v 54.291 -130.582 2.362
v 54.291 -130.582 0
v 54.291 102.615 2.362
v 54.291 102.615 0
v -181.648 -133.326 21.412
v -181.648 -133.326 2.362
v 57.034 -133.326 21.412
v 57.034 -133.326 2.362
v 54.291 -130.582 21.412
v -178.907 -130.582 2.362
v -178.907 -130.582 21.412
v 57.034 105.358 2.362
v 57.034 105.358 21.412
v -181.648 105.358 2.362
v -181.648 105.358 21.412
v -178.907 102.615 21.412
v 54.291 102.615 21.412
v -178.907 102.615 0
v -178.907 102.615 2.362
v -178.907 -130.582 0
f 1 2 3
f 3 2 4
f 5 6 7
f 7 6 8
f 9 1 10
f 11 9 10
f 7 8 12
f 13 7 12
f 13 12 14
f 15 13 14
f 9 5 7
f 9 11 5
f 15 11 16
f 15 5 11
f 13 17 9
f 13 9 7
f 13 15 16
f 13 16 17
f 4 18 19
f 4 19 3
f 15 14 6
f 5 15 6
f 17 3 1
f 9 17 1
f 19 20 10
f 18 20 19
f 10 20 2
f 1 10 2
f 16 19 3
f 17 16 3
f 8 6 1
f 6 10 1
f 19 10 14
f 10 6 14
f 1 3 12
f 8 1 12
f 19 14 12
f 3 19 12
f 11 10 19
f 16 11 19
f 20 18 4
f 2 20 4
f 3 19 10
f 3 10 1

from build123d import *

# Parameters (mm, degrees)
F0_W     = 233.1974
F0_H     = 233.1974
F1_DEPTH = 2.3622
F3_DEPTH = 19.05


with BuildPart() as f1:
    # F0 (on Top) → F1 (new body)
    with BuildSketch(Plane.XY):
        with Locations((-62.308144, -13.983691)):
            Rectangle(F0_W, F0_H)
    extrude(amount=F1_DEPTH)


with BuildPart() as f3:
    # F2 (on face) → F3 (new body)
    with BuildSketch(Plane.XY.offset(2.3622)):
        Polygon((-153.363779, 105.358209), (-181.647631, 105.358209), (-181.647631, -12.04132), (-178.906844, -12.04132), (-178.906844, 102.615009), (-153.363779, 102.615009), align=None)
        Polygon((-178.906844, -12.04132), (-181.647631, -12.04132), (-181.647631, -133.325591), (-62.306937, -133.325591), (-62.306937, -130.582391), (-178.906844, -130.582391), align=None)
        Polygon((57.033756, 105.358209), (-153.363779, 105.358209), (-153.363779, 102.615009), (54.290556, 102.615009), (54.290556, -13.983691), (57.033756, -13.983691), align=None)
        Polygon((57.033756, -133.325591), (57.033756, -13.983691), (54.290556, -13.983691), (54.290556, -130.582391), (-62.306937, -130.582391), (-62.306937, -133.325591), align=None)
    extrude(amount=F3_DEPTH)


solid = Compound([f1.part, f3.part])
